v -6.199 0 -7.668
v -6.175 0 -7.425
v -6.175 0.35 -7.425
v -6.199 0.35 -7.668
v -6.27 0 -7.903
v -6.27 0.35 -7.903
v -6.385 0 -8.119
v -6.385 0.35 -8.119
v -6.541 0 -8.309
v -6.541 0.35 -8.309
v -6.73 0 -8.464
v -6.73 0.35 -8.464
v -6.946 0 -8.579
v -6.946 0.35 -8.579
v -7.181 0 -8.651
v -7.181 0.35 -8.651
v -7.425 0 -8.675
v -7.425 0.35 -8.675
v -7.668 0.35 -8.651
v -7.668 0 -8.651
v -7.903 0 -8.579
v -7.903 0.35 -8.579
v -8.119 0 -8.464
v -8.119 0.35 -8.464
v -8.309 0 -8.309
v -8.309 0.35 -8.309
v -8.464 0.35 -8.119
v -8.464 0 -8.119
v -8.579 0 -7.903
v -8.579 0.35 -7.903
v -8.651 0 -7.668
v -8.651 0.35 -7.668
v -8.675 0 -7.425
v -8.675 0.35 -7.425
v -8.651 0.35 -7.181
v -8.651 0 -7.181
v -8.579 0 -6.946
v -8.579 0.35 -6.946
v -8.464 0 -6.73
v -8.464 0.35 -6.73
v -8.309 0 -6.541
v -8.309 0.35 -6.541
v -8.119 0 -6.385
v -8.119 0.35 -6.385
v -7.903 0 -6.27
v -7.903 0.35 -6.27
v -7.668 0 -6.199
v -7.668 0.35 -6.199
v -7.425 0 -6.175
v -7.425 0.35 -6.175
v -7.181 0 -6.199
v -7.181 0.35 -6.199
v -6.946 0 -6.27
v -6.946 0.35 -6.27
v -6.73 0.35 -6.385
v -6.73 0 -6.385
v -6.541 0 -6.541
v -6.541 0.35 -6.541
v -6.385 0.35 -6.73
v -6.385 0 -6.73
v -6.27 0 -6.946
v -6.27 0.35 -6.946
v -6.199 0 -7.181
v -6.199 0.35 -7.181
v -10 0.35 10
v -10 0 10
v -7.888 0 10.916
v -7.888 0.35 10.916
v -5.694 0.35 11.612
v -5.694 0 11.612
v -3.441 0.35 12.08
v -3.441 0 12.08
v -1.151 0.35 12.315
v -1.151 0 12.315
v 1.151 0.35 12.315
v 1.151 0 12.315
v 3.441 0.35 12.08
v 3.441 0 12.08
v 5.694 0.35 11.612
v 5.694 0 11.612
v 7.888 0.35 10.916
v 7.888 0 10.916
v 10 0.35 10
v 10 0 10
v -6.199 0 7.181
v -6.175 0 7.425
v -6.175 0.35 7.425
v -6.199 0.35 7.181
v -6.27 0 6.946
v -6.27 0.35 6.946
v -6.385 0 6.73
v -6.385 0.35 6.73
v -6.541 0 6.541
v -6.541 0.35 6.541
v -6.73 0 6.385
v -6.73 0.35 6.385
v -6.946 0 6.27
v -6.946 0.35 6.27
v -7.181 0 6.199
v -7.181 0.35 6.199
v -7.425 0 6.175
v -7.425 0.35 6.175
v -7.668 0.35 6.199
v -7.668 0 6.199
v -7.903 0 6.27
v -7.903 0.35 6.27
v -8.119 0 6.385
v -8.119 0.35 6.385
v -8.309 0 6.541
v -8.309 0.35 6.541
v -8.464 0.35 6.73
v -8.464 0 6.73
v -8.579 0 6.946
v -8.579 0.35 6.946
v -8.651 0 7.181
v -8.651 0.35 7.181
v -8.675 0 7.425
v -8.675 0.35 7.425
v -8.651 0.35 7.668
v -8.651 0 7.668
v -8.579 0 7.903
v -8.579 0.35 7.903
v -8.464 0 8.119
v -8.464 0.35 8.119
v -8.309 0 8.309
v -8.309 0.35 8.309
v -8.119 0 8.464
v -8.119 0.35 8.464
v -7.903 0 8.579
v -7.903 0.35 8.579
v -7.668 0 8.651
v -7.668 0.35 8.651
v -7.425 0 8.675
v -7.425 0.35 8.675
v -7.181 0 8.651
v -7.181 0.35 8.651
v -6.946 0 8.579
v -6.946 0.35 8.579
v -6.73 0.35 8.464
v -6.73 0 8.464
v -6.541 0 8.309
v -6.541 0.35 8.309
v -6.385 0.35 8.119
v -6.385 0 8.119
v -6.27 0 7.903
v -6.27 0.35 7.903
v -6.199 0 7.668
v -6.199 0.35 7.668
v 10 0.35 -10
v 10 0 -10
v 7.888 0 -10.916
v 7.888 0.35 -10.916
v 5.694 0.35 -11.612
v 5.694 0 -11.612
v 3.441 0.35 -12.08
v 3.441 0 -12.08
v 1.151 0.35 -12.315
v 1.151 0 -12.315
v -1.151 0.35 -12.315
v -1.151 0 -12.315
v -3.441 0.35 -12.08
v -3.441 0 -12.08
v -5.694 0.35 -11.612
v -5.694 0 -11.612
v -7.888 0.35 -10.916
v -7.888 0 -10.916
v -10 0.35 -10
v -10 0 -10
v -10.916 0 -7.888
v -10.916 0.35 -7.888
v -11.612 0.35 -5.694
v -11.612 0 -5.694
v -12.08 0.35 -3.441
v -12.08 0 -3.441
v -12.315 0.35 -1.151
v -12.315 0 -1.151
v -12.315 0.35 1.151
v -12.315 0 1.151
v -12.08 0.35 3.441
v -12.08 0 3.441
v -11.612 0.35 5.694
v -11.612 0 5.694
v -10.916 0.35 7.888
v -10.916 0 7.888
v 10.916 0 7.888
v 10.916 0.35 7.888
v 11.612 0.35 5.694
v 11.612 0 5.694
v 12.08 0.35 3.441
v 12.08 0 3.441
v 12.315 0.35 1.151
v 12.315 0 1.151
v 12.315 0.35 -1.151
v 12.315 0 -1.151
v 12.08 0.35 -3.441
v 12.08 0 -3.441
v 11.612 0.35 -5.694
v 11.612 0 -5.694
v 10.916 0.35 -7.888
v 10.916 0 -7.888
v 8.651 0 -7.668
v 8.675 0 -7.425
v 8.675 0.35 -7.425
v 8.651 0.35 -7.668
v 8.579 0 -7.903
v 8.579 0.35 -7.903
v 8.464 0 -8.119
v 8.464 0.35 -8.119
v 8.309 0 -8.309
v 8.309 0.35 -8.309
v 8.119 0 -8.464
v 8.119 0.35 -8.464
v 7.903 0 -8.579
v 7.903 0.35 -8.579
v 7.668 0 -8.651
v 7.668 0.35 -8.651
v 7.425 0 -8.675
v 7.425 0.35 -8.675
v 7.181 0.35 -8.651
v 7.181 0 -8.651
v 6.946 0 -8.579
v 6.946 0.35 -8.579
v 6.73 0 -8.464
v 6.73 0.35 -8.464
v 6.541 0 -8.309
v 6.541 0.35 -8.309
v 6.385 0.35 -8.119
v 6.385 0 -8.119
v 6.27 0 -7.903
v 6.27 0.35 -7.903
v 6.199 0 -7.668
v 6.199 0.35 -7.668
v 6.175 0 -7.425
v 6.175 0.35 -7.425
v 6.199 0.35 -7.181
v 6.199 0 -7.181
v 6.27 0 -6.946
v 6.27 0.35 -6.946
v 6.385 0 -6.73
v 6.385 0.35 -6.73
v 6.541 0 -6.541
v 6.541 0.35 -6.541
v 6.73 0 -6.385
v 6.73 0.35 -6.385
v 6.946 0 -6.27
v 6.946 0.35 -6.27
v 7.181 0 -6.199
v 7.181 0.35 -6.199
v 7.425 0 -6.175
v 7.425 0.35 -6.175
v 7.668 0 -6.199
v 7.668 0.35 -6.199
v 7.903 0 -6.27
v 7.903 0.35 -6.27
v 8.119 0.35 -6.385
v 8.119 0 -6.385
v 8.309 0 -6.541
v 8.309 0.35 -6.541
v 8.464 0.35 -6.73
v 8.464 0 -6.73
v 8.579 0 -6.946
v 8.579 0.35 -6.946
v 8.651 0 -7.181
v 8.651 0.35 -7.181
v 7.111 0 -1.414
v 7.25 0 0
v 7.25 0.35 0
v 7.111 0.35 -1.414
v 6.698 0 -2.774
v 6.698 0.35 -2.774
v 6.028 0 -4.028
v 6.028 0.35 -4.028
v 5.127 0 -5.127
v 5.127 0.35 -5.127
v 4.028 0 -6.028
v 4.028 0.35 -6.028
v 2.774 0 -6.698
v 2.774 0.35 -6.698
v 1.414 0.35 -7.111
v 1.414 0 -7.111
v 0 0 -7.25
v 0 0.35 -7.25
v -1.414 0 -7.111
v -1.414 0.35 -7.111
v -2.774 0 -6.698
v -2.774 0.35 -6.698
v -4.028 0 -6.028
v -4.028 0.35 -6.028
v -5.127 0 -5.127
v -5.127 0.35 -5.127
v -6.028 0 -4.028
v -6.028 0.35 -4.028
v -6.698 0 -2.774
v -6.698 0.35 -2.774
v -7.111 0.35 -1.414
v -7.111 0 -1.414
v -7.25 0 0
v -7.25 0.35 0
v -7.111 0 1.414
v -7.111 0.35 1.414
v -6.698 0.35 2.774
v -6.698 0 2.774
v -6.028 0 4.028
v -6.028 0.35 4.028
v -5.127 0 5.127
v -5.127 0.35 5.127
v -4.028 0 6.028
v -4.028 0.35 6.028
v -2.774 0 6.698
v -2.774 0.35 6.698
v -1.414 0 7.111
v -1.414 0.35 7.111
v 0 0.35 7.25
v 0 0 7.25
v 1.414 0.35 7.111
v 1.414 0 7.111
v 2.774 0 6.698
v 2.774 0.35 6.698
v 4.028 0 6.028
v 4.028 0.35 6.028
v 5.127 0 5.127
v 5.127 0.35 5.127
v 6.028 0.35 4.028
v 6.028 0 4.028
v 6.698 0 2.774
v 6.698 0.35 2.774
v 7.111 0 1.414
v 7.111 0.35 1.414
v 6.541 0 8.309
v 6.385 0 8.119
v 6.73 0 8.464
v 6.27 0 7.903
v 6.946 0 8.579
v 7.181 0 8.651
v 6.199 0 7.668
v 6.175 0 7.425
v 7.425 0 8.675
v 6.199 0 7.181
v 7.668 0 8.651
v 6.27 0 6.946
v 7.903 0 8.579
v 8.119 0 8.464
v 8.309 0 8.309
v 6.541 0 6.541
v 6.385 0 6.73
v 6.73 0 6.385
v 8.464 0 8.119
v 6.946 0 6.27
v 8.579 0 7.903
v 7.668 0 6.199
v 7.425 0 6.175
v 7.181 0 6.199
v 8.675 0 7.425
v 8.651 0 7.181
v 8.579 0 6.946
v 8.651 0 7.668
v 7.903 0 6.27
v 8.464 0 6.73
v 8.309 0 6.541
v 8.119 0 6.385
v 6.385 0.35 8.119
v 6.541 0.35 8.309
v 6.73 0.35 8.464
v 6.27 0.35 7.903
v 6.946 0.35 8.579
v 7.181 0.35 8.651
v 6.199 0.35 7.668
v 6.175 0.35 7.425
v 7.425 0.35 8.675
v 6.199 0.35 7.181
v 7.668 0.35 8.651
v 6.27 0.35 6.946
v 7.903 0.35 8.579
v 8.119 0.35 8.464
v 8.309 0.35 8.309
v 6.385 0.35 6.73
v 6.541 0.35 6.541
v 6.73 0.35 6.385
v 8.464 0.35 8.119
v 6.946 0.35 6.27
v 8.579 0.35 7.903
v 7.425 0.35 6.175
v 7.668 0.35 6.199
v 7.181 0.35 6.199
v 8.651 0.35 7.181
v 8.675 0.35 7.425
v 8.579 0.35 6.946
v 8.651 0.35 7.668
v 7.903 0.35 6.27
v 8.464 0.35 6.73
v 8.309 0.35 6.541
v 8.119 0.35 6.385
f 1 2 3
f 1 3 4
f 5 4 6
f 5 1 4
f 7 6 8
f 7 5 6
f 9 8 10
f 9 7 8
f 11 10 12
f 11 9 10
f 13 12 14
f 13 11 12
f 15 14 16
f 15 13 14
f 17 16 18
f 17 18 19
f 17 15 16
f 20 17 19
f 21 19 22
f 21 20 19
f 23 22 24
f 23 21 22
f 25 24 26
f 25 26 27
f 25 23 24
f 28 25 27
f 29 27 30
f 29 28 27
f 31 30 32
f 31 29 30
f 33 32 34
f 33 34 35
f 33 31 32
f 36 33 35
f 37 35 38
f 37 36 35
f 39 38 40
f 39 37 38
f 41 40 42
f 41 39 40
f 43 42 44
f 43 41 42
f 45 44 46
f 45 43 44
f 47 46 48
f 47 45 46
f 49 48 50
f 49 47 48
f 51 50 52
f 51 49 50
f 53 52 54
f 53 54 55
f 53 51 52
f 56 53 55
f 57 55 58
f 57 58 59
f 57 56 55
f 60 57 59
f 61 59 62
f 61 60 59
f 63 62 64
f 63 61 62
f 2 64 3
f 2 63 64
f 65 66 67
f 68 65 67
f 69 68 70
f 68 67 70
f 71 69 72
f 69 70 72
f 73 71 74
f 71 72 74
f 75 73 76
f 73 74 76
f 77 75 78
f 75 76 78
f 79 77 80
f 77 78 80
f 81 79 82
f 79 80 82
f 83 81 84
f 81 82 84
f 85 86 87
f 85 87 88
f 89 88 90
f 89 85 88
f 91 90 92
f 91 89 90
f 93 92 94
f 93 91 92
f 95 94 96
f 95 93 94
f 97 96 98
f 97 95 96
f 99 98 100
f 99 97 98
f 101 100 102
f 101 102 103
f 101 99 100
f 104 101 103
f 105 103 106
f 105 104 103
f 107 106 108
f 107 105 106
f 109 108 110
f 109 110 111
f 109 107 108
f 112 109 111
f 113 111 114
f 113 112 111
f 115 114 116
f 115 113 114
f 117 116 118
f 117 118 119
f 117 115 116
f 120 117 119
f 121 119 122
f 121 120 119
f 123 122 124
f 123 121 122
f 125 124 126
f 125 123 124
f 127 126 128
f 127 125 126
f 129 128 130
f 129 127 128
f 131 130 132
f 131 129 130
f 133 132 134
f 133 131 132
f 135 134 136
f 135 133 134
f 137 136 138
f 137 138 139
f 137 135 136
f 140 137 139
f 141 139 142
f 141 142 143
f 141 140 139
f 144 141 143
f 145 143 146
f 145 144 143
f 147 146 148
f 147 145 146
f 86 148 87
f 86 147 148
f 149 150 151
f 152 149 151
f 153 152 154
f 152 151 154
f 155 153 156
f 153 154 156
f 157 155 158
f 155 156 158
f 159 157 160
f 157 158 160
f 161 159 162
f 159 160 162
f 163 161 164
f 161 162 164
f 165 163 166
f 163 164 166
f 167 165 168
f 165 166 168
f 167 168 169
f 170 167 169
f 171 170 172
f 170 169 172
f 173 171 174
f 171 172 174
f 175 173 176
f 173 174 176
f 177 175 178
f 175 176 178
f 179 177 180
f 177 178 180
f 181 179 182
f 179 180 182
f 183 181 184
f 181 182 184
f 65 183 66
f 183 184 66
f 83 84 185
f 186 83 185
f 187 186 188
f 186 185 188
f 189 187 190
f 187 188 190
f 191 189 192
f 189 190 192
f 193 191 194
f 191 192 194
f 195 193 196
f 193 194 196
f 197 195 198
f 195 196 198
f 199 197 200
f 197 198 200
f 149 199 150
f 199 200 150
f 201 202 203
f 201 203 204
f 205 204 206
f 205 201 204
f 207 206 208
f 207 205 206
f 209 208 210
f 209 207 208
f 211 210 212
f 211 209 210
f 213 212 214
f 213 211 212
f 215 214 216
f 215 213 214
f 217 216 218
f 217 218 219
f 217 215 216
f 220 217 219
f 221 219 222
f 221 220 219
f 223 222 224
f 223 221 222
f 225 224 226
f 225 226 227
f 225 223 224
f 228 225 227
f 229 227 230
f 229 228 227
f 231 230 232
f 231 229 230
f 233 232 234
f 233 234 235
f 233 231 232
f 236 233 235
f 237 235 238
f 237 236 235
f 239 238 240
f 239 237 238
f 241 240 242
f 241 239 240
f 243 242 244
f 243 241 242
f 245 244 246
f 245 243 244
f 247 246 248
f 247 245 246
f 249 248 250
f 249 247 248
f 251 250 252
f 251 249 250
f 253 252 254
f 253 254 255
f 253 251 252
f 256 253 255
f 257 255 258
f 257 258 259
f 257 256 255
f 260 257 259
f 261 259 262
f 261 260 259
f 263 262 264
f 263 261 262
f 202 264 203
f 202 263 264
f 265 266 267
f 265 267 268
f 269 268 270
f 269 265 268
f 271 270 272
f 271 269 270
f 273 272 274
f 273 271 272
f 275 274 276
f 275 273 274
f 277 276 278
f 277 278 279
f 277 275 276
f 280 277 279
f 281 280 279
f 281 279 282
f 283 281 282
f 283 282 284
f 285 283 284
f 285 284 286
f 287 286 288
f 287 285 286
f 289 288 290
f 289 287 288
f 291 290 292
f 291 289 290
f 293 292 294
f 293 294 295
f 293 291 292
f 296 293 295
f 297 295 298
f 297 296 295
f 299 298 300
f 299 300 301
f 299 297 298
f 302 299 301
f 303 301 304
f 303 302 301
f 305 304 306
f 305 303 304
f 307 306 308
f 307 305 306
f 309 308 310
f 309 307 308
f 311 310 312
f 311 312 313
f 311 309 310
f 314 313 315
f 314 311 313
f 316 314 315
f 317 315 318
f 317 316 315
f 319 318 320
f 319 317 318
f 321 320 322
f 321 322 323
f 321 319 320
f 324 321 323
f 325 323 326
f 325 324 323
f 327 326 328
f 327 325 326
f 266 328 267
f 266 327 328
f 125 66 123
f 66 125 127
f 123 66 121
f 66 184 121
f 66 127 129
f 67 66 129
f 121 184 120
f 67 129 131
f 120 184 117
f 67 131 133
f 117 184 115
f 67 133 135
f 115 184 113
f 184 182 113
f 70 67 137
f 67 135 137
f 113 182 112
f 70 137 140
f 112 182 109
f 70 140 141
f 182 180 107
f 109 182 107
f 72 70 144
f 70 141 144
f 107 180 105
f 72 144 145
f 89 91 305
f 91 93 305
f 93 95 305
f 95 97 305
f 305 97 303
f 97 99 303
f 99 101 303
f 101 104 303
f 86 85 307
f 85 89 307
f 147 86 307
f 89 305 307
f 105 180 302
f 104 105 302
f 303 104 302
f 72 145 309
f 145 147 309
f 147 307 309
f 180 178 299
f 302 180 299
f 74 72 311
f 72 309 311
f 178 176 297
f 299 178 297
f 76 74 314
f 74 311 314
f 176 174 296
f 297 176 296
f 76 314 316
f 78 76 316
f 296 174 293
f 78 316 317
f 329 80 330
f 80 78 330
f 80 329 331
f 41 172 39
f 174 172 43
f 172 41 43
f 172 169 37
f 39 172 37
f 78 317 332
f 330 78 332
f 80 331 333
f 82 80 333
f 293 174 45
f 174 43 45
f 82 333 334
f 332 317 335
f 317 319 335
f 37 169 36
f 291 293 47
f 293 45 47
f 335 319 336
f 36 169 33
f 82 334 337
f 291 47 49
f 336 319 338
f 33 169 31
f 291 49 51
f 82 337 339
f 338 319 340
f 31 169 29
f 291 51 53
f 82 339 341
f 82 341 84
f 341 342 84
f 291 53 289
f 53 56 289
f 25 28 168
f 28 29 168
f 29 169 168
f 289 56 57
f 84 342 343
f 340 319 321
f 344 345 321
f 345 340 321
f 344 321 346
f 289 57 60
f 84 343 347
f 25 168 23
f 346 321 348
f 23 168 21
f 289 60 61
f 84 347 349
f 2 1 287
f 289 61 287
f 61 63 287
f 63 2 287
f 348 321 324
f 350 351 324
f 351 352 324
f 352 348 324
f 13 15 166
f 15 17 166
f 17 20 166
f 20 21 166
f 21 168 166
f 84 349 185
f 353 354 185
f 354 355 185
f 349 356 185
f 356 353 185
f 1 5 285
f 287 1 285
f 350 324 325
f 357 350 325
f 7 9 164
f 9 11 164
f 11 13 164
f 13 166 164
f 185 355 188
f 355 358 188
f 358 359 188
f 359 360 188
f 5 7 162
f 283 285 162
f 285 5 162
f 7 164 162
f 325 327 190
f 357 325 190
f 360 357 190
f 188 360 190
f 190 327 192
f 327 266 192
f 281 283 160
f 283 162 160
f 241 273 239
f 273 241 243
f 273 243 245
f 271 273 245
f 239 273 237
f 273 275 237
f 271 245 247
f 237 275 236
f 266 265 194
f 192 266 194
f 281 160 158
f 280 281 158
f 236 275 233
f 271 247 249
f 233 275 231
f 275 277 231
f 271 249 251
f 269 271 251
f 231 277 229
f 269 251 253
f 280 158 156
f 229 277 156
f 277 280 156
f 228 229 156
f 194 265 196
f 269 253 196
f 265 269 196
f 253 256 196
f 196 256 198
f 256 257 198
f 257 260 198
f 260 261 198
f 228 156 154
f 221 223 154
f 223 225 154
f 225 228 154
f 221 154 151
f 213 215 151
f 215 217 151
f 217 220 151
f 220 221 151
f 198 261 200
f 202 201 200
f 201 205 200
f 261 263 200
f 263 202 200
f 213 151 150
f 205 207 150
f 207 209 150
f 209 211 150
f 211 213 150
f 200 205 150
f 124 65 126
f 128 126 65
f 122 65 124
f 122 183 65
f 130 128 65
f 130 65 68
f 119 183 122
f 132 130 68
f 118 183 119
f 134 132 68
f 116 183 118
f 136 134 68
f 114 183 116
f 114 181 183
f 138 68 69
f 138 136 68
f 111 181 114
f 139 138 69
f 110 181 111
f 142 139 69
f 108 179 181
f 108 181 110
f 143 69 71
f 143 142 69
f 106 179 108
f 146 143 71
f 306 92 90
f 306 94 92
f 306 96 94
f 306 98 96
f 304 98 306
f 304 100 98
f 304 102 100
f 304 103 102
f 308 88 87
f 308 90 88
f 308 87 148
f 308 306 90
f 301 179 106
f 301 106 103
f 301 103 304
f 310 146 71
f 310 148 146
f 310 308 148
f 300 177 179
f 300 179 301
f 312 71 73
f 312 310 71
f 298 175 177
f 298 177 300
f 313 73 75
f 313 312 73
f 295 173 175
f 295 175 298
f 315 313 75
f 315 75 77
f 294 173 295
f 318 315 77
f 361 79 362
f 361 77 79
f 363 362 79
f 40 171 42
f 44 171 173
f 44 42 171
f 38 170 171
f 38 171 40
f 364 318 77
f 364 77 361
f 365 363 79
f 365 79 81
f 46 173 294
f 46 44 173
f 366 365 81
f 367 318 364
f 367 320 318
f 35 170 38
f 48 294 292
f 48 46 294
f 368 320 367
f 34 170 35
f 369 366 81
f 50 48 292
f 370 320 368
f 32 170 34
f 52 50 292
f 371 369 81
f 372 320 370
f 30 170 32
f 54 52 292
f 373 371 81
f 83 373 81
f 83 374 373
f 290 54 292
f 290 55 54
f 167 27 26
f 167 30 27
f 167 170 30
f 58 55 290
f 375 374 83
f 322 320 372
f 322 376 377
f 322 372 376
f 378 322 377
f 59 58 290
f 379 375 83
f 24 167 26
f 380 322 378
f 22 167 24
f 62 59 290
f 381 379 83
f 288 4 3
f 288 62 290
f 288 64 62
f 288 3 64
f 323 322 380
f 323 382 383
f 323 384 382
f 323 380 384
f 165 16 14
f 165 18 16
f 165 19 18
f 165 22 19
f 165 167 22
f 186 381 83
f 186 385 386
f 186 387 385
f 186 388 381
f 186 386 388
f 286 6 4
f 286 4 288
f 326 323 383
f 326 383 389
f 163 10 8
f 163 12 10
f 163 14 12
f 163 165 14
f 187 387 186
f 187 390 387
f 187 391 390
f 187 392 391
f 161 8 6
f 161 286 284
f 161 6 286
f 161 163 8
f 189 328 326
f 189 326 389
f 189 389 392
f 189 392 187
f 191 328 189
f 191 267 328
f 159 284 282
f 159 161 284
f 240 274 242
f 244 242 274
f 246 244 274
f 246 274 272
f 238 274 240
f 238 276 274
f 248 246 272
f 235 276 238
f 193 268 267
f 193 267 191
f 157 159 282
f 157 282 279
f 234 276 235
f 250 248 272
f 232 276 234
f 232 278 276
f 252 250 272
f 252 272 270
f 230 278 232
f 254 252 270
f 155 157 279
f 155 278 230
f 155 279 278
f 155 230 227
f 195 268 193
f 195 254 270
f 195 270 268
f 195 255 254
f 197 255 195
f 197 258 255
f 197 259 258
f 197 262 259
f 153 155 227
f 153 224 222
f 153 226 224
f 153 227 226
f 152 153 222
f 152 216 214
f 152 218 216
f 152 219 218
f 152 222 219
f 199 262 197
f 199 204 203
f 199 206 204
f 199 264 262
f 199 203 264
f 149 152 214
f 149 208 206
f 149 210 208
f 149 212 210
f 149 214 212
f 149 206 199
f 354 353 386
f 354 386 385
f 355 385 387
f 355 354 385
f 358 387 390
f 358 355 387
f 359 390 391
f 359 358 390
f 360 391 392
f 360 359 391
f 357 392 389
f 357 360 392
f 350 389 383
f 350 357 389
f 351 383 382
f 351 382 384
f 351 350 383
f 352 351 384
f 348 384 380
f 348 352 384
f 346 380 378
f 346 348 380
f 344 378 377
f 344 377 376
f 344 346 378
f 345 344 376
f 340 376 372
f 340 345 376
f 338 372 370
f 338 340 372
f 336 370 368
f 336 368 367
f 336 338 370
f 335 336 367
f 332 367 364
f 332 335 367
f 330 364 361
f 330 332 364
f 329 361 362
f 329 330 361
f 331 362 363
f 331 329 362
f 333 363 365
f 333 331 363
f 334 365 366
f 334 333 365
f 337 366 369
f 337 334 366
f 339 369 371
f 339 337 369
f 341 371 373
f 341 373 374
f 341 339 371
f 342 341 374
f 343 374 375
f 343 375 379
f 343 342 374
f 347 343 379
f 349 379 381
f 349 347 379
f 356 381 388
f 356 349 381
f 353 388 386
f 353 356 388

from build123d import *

# Parameters (mm, degrees)
SKETCH1_R           = 7.25
SKETCH1_R_2         = 1.25
BOSS_EXTRUDE1_DEPTH = 0.35


with BuildPart() as part:
    # Sketch1 → Boss-Extrude1 (new body)
    with BuildSketch(Plane(origin=(0, 0, 0), x_dir=(1, 0, 0), z_dir=(0, 1, 0))):
        with BuildLine():
            ThreePointArc((10, -10), (12.344355629, 0), (10, 10))
            ThreePointArc((10, 10), (0, 12.344355629), (-10, 10))
            ThreePointArc((-10, 10), (-12.344355629, 0), (-10, -10))
            ThreePointArc((-10, -10), (0, -12.344355629), (10, -10))
        make_face()
        Circle(SKETCH1_R, mode=Mode.SUBTRACT)
        with Locations((7.424621202, 7.424621202)):
            Circle(SKETCH1_R_2, mode=Mode.SUBTRACT)
        with Locations((7.424621202, -7.424621202)):
            Circle(SKETCH1_R_2, mode=Mode.SUBTRACT)
        with Locations((-7.424621202, -7.424621202)):
            Circle(SKETCH1_R_2, mode=Mode.SUBTRACT)
        with Locations((-7.424621202, 7.424621202)):
            Circle(SKETCH1_R_2, mode=Mode.SUBTRACT)
    extrude(amount=BOSS_EXTRUDE1_DEPTH)


solid = part.part
